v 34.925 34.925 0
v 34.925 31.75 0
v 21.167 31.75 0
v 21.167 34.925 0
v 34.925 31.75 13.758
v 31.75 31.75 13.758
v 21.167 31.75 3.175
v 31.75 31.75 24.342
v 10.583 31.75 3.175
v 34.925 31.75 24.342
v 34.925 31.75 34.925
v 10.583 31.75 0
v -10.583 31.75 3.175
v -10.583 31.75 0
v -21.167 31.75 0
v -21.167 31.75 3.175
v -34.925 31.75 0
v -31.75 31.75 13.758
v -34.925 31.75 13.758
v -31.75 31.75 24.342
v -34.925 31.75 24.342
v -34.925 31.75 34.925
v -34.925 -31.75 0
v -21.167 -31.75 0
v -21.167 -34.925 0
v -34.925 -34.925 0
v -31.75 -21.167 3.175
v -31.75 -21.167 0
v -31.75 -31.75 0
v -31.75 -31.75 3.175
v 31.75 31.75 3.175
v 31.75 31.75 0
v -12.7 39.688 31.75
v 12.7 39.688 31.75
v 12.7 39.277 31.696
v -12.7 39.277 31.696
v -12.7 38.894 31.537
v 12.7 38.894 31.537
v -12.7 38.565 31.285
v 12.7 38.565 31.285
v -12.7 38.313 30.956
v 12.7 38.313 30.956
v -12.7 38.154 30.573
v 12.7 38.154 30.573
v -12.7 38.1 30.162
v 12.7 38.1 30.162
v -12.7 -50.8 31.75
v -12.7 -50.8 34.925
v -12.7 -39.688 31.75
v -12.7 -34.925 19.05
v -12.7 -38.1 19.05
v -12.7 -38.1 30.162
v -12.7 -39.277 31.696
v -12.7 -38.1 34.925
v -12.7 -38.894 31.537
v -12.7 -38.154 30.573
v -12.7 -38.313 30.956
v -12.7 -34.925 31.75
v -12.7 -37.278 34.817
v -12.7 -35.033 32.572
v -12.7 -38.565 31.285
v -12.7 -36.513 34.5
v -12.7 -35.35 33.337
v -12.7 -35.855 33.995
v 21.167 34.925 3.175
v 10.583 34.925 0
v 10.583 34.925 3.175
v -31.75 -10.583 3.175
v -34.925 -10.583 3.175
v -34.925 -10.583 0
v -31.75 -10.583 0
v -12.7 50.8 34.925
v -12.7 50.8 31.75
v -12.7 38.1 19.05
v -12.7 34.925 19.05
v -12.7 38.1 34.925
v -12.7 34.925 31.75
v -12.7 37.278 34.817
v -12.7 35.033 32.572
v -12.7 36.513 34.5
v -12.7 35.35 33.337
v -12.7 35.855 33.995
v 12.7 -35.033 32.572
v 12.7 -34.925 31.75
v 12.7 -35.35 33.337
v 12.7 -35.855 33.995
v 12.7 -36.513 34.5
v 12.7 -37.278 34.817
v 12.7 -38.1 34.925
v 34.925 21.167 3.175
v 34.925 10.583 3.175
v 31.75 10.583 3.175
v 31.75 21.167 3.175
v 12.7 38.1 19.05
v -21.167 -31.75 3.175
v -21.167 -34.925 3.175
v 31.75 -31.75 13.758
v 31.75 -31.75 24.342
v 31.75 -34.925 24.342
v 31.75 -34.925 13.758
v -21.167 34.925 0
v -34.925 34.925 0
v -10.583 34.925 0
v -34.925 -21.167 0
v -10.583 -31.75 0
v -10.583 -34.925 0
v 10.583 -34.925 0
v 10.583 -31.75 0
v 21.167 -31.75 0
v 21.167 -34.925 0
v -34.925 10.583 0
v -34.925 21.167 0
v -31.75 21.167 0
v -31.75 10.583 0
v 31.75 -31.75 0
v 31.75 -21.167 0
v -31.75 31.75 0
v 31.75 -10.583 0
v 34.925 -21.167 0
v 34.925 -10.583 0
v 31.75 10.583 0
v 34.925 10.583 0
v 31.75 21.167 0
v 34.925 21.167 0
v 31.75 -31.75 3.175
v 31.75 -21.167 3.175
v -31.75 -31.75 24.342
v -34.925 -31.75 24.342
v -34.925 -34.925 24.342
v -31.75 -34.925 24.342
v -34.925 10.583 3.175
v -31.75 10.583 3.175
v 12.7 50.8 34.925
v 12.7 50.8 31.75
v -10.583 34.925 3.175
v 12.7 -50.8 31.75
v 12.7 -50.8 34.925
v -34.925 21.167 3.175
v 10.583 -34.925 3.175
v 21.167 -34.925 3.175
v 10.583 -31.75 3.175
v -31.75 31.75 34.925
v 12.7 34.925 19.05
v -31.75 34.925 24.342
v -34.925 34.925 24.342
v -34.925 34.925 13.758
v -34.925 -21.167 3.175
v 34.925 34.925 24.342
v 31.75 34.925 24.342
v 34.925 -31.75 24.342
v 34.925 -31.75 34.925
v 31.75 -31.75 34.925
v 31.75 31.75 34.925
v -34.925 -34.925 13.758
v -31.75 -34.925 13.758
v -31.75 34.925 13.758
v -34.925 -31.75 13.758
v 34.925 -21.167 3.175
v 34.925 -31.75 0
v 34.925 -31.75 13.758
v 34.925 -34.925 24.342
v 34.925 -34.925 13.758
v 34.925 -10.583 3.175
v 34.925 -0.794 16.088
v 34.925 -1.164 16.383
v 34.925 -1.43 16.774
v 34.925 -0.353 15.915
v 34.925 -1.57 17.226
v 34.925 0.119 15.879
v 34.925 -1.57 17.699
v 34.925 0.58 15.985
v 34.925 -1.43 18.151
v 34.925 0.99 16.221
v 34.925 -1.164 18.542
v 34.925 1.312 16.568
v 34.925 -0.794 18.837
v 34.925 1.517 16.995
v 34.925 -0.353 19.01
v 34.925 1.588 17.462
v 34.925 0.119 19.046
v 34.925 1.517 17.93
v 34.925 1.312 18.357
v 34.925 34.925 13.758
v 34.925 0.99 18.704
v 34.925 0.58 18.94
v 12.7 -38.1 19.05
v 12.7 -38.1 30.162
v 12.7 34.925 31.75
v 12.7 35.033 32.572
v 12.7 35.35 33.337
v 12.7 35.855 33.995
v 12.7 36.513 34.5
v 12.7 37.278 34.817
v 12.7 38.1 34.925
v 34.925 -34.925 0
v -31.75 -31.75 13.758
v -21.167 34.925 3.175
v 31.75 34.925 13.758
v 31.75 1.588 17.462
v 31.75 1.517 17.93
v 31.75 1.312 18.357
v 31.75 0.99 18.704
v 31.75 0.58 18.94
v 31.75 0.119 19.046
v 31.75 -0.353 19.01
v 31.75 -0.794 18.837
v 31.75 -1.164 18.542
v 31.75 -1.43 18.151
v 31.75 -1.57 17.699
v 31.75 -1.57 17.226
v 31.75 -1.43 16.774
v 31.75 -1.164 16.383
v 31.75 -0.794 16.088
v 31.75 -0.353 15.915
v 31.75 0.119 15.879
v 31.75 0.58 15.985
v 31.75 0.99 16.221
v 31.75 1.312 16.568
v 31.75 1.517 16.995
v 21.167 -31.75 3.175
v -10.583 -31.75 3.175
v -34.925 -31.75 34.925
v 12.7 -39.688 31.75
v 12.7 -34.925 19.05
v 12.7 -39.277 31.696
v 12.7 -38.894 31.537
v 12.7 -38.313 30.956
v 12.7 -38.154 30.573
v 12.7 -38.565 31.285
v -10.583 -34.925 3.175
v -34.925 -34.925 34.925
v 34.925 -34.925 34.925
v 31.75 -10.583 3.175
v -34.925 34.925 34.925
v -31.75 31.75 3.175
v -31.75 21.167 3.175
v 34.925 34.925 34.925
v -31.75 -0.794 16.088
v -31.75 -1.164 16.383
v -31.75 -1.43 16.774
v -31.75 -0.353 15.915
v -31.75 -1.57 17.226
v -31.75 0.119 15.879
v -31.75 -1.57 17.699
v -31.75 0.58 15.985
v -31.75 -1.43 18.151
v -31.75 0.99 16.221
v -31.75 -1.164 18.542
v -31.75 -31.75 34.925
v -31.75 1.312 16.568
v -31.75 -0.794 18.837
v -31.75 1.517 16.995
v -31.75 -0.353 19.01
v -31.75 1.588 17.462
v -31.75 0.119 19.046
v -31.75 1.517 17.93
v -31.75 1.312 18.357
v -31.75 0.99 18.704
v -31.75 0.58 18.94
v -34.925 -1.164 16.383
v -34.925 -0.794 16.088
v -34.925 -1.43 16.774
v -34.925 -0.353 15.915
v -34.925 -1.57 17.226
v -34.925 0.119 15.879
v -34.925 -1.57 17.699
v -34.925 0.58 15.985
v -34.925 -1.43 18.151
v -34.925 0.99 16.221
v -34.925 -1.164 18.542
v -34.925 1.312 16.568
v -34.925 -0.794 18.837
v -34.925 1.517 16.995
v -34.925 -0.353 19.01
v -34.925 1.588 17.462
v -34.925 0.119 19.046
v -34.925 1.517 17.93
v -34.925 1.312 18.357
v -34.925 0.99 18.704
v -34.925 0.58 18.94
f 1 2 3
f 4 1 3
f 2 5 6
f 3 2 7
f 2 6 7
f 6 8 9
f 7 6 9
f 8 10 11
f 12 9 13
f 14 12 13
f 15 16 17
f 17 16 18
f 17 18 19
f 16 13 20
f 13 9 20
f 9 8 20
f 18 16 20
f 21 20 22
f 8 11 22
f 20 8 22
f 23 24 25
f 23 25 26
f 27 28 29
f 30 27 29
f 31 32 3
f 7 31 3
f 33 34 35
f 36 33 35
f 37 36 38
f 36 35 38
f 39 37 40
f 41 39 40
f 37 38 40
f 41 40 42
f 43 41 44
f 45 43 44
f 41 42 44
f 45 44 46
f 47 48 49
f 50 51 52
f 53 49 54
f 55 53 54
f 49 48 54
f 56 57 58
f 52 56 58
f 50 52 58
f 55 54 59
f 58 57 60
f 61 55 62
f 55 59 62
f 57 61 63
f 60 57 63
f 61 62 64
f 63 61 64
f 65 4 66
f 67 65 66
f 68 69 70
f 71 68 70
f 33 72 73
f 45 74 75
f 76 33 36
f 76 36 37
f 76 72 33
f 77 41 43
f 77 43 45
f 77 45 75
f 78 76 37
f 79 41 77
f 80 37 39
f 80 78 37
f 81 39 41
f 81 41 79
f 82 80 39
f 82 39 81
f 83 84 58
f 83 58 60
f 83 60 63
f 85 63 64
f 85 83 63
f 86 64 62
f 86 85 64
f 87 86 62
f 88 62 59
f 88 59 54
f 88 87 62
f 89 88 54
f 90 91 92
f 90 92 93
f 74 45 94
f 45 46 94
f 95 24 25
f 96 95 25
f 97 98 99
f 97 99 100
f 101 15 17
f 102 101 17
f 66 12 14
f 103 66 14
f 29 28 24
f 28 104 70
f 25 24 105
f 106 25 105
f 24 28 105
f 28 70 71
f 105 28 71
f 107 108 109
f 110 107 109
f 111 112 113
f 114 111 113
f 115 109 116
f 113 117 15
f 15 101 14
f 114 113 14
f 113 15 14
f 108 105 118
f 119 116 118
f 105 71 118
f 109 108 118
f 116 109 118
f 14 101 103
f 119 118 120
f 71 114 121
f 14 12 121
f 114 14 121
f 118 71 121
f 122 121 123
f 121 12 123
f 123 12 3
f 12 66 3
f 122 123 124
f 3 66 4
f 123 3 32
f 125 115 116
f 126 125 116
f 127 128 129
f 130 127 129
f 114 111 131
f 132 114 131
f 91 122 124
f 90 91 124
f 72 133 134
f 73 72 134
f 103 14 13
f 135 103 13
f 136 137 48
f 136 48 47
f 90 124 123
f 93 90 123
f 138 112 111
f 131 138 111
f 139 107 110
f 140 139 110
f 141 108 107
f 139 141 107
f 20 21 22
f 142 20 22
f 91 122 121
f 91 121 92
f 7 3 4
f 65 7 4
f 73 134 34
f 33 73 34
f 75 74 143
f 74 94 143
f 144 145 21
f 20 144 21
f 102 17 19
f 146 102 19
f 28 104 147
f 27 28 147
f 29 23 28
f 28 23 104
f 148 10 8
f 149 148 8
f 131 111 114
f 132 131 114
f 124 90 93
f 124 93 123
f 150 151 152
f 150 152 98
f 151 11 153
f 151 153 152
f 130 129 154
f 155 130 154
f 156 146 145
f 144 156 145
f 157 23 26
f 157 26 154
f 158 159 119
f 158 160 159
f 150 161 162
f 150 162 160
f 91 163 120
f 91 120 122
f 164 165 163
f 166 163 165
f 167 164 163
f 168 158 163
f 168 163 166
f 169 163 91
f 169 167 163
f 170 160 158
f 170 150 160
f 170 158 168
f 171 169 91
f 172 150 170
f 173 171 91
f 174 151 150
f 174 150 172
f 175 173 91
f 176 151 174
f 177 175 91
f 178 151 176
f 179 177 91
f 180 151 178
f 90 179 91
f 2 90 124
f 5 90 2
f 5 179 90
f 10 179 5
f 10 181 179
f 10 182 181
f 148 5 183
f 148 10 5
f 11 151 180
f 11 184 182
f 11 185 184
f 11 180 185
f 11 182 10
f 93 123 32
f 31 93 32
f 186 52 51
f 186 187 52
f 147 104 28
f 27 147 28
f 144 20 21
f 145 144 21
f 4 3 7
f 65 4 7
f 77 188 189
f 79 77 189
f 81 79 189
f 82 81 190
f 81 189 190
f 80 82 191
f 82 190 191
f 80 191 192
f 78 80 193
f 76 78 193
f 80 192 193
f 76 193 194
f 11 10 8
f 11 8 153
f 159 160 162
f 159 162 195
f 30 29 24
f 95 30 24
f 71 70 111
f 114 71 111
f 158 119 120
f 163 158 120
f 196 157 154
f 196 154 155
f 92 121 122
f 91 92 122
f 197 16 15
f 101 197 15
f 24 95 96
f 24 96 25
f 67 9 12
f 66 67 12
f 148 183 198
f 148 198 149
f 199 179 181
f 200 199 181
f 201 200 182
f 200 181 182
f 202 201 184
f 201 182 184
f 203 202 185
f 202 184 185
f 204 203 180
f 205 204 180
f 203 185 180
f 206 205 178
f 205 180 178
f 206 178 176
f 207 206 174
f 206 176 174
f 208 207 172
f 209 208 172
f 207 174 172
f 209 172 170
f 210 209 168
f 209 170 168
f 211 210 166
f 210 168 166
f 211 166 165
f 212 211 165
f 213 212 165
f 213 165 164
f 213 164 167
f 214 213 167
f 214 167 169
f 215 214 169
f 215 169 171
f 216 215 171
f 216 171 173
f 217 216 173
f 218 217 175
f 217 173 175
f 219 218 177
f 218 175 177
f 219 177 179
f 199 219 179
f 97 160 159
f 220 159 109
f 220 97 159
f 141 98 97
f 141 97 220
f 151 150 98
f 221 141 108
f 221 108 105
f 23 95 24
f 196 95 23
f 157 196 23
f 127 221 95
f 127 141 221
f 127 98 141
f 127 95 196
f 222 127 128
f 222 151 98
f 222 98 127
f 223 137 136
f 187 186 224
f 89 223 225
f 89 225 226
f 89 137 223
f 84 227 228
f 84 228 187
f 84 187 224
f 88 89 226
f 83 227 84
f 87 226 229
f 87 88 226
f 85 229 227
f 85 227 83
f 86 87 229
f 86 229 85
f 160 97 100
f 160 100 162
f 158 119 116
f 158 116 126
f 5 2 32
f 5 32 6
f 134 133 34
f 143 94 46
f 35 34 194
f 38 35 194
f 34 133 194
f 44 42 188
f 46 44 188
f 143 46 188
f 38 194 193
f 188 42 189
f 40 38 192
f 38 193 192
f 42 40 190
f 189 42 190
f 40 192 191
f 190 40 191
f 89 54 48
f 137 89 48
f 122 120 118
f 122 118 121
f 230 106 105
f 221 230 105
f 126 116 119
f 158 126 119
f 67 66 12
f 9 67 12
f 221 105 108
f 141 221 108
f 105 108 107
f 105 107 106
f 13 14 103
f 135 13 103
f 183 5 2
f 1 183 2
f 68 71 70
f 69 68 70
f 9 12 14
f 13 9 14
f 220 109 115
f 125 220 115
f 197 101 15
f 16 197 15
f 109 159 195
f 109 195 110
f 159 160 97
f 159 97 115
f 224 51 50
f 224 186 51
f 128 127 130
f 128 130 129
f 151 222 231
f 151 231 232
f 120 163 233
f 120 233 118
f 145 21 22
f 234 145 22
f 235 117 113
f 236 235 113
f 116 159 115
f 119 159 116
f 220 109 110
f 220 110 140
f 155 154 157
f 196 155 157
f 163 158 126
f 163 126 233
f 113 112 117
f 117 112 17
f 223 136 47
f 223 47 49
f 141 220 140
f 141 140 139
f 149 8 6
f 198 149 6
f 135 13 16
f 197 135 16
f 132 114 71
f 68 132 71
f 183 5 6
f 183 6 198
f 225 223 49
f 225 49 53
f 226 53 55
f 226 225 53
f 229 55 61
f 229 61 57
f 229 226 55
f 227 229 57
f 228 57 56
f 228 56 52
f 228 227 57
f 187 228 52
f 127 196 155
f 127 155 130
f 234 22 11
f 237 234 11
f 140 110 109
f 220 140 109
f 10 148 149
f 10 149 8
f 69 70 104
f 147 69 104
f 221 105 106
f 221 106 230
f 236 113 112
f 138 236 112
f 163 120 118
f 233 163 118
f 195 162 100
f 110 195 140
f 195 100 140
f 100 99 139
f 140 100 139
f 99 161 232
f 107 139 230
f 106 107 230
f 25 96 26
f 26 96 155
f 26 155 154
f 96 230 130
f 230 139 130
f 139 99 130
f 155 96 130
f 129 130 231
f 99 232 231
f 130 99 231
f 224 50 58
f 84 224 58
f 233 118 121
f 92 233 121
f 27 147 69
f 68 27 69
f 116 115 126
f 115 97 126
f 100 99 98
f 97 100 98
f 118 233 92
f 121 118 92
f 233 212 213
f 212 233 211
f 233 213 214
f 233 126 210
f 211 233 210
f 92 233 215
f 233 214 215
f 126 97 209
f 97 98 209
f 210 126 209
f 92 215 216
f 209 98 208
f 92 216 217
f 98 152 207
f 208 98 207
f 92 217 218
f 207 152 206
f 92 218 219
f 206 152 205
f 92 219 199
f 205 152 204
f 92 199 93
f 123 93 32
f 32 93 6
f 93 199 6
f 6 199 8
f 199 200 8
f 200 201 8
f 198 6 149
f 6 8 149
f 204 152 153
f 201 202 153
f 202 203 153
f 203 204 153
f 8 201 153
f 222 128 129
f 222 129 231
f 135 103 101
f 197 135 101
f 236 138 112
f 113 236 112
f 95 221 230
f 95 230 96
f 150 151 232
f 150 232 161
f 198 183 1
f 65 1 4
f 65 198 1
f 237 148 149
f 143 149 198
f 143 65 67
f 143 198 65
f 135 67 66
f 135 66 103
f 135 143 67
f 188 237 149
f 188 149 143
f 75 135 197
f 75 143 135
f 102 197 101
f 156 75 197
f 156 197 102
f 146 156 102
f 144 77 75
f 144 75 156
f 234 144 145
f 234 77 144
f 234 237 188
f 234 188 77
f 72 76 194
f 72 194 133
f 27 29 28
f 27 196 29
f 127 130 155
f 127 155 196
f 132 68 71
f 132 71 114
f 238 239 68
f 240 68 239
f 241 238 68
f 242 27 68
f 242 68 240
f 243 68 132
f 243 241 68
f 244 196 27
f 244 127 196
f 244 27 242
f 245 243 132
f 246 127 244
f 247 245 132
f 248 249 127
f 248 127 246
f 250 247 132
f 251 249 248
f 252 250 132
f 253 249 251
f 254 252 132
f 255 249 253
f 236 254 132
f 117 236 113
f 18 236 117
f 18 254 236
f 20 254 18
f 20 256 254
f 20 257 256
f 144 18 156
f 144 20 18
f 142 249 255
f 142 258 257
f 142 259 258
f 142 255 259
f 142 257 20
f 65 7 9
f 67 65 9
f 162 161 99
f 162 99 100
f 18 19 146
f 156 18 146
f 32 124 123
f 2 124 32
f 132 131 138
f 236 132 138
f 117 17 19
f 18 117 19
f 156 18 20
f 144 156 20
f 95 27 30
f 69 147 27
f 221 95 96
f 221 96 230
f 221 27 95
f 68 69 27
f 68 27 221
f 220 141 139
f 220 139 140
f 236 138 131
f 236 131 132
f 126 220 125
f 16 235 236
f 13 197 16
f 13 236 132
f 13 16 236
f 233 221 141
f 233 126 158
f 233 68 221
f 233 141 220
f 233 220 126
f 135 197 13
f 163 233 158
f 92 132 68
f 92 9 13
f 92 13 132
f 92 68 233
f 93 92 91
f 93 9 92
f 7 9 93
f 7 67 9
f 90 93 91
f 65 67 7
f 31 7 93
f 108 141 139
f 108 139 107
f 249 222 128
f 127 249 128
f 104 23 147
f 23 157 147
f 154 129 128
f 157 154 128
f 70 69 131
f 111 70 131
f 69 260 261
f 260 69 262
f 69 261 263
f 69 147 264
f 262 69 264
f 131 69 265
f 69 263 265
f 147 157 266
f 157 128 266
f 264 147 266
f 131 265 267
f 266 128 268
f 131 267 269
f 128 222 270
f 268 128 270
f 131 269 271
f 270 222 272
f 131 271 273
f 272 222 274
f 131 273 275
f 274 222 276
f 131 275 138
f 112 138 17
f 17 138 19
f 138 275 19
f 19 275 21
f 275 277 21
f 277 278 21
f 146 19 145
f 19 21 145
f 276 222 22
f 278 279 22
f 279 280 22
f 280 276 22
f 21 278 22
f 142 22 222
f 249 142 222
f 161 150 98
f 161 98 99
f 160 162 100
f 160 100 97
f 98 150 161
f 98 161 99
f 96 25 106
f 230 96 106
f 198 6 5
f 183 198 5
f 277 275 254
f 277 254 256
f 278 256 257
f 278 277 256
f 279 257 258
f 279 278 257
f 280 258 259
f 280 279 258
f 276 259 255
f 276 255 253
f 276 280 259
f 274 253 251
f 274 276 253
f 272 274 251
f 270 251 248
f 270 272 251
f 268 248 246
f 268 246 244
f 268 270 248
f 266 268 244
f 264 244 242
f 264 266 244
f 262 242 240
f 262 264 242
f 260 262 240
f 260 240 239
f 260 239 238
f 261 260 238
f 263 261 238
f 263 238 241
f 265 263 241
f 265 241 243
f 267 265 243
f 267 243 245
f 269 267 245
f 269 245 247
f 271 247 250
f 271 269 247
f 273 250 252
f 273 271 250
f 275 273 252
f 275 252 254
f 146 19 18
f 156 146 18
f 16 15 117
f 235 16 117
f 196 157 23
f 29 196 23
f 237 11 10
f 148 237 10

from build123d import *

# Parameters (mm, degrees)
F1_DEPTH      = 3.175
F2_R          = 1.5875
F3_DEPTH      = 3.175
F6_DEPTH      = 3.175
F9_DEPTH      = 12.7
F9_DEPTH_BACK = 12.7


with BuildPart() as f1:
    # F0 (on Top) → F1 (new body)
    with BuildSketch(Plane.XY):
        Polygon((-21.166667, 31.75), (-31.75, 31.75), (-31.75, 21.166667), (-34.925, 21.166667), (-34.925, 10.583333), (-31.75, 10.583333), (-31.75, 0), (-31.75, -10.583333), (-34.925, -10.583333), (-34.925, -21.166667), (-31.75, -21.166667), (-31.75, -31.75), (-21.166667, -31.75), (-21.166667, -34.925), (-10.583333, -34.925), (-10.583333, -31.75), (0, -31.75), (10.583333, -31.75), (10.583333, -34.925), (21.166667, -34.925), (21.166667, -31.75), (31.75, -31.75), (31.75, -21.166667), (34.925, -21.166667), (34.925, -10.583333), (31.75, -10.583333), (31.75, 0), (31.75, 10.583333), (34.925, 10.583333), (34.925, 21.166667), (31.75, 21.166667), (31.75, 31.75), (21.166667, 31.75), (21.166667, 34.925), (10.583333, 34.925), (10.583333, 31.75), (0, 31.75), (-10.583333, 31.75), (-10.583333, 34.925), (-21.166667, 34.925), align=None)
    extrude(amount=F1_DEPTH)


with BuildPart() as f3:
    # F2 (on face) → F3 (new body, through all)
    with BuildSketch(Plane.YZ.offset(34.925)):
        Polygon((-31.75, 3.175), (-31.75, 0), (-21.166667, 0), (-21.166667, 3.175), (-10.583333, 3.175), (-10.583333, 0), (10.583333, 0), (10.583333, 3.175), (21.166667, 3.175), (21.166667, 0), (31.75, 0), (31.75, 3.175), (31.75, 13.758333), (34.925, 13.758333), (34.925, 24.341667), (31.75, 24.341667), (31.75, 34.925), (-31.75, 34.925), (-31.75, 24.341667), (-34.925, 24.341667), (-34.925, 13.758333), (-31.75, 13.758333), align=None)
        with Locations((0, 17.4625)):
            Circle(F2_R, mode=Mode.SUBTRACT)
    extrude(amount=-F3_DEPTH)


with BuildPart() as f4_1:
    # F4: instance of F3
    add(f3.part.mirror(Plane.YZ))


with BuildPart() as f6:
    # F5 (on face) → F6 (new body)
    with BuildSketch(Plane(origin=(0, 31.75, 0), x_dir=(-1, 0, 0), z_dir=(0, 1, 0))):
        Polygon((31.75, 24.341667), (34.925, 24.341667), (34.925, 34.925), (-34.925, 34.925), (-34.925, 24.341667), (-31.75, 24.341667), (-31.75, 13.758333), (-34.925, 13.758333), (-34.925, 0), (-21.166667, 0), (-21.166667, 3.175), (-10.583333, 3.175), (-10.583333, 0), (10.583333, 0), (10.583333, 3.175), (21.166667, 3.175), (21.166667, 0), (34.925, 0), (34.925, 13.758333), (31.75, 13.758333), align=None)
    extrude(amount=F6_DEPTH)

    # F10: F9 across plane


with BuildPart() as f7_1:
    # F7: instance of F6
    add(f6.part.mirror(Plane.XZ))


with BuildPart() as f9:
    # F8 (on Right) → F9 (new body, two sides)
    with BuildSketch(Plane.YZ) as f9_sk:
        with BuildLine():
            Line((-34.925, 19.05), (-34.925, 31.75))
            ThreePointArc((-34.925, 31.75), (-35.854936, 33.995064), (-38.1, 34.925))
            Line((-38.1, 34.925), (-50.8, 34.925))
            Line((-50.8, 34.925), (-50.8, 31.75))
            Line((-50.8, 31.75), (-39.6875, 31.75))
            ThreePointArc((-39.6875, 31.75), (-38.564968, 31.285032), (-38.1, 30.1625))
            Line((-38.1, 30.1625), (-38.1, 19.05))
            Line((-38.1, 19.05), (-34.925, 19.05))
        make_face()
    extrude(amount=F9_DEPTH)
    extrude(f9_sk.sketch, amount=-F9_DEPTH_BACK)


with BuildPart() as f6_1:
    add(f6.part)
    add(f9.part.mirror(Plane.XZ))


solid = Compound([f1.part, f3.part, f4_1.part, f7_1.part, f9.part, f6_1.part])
